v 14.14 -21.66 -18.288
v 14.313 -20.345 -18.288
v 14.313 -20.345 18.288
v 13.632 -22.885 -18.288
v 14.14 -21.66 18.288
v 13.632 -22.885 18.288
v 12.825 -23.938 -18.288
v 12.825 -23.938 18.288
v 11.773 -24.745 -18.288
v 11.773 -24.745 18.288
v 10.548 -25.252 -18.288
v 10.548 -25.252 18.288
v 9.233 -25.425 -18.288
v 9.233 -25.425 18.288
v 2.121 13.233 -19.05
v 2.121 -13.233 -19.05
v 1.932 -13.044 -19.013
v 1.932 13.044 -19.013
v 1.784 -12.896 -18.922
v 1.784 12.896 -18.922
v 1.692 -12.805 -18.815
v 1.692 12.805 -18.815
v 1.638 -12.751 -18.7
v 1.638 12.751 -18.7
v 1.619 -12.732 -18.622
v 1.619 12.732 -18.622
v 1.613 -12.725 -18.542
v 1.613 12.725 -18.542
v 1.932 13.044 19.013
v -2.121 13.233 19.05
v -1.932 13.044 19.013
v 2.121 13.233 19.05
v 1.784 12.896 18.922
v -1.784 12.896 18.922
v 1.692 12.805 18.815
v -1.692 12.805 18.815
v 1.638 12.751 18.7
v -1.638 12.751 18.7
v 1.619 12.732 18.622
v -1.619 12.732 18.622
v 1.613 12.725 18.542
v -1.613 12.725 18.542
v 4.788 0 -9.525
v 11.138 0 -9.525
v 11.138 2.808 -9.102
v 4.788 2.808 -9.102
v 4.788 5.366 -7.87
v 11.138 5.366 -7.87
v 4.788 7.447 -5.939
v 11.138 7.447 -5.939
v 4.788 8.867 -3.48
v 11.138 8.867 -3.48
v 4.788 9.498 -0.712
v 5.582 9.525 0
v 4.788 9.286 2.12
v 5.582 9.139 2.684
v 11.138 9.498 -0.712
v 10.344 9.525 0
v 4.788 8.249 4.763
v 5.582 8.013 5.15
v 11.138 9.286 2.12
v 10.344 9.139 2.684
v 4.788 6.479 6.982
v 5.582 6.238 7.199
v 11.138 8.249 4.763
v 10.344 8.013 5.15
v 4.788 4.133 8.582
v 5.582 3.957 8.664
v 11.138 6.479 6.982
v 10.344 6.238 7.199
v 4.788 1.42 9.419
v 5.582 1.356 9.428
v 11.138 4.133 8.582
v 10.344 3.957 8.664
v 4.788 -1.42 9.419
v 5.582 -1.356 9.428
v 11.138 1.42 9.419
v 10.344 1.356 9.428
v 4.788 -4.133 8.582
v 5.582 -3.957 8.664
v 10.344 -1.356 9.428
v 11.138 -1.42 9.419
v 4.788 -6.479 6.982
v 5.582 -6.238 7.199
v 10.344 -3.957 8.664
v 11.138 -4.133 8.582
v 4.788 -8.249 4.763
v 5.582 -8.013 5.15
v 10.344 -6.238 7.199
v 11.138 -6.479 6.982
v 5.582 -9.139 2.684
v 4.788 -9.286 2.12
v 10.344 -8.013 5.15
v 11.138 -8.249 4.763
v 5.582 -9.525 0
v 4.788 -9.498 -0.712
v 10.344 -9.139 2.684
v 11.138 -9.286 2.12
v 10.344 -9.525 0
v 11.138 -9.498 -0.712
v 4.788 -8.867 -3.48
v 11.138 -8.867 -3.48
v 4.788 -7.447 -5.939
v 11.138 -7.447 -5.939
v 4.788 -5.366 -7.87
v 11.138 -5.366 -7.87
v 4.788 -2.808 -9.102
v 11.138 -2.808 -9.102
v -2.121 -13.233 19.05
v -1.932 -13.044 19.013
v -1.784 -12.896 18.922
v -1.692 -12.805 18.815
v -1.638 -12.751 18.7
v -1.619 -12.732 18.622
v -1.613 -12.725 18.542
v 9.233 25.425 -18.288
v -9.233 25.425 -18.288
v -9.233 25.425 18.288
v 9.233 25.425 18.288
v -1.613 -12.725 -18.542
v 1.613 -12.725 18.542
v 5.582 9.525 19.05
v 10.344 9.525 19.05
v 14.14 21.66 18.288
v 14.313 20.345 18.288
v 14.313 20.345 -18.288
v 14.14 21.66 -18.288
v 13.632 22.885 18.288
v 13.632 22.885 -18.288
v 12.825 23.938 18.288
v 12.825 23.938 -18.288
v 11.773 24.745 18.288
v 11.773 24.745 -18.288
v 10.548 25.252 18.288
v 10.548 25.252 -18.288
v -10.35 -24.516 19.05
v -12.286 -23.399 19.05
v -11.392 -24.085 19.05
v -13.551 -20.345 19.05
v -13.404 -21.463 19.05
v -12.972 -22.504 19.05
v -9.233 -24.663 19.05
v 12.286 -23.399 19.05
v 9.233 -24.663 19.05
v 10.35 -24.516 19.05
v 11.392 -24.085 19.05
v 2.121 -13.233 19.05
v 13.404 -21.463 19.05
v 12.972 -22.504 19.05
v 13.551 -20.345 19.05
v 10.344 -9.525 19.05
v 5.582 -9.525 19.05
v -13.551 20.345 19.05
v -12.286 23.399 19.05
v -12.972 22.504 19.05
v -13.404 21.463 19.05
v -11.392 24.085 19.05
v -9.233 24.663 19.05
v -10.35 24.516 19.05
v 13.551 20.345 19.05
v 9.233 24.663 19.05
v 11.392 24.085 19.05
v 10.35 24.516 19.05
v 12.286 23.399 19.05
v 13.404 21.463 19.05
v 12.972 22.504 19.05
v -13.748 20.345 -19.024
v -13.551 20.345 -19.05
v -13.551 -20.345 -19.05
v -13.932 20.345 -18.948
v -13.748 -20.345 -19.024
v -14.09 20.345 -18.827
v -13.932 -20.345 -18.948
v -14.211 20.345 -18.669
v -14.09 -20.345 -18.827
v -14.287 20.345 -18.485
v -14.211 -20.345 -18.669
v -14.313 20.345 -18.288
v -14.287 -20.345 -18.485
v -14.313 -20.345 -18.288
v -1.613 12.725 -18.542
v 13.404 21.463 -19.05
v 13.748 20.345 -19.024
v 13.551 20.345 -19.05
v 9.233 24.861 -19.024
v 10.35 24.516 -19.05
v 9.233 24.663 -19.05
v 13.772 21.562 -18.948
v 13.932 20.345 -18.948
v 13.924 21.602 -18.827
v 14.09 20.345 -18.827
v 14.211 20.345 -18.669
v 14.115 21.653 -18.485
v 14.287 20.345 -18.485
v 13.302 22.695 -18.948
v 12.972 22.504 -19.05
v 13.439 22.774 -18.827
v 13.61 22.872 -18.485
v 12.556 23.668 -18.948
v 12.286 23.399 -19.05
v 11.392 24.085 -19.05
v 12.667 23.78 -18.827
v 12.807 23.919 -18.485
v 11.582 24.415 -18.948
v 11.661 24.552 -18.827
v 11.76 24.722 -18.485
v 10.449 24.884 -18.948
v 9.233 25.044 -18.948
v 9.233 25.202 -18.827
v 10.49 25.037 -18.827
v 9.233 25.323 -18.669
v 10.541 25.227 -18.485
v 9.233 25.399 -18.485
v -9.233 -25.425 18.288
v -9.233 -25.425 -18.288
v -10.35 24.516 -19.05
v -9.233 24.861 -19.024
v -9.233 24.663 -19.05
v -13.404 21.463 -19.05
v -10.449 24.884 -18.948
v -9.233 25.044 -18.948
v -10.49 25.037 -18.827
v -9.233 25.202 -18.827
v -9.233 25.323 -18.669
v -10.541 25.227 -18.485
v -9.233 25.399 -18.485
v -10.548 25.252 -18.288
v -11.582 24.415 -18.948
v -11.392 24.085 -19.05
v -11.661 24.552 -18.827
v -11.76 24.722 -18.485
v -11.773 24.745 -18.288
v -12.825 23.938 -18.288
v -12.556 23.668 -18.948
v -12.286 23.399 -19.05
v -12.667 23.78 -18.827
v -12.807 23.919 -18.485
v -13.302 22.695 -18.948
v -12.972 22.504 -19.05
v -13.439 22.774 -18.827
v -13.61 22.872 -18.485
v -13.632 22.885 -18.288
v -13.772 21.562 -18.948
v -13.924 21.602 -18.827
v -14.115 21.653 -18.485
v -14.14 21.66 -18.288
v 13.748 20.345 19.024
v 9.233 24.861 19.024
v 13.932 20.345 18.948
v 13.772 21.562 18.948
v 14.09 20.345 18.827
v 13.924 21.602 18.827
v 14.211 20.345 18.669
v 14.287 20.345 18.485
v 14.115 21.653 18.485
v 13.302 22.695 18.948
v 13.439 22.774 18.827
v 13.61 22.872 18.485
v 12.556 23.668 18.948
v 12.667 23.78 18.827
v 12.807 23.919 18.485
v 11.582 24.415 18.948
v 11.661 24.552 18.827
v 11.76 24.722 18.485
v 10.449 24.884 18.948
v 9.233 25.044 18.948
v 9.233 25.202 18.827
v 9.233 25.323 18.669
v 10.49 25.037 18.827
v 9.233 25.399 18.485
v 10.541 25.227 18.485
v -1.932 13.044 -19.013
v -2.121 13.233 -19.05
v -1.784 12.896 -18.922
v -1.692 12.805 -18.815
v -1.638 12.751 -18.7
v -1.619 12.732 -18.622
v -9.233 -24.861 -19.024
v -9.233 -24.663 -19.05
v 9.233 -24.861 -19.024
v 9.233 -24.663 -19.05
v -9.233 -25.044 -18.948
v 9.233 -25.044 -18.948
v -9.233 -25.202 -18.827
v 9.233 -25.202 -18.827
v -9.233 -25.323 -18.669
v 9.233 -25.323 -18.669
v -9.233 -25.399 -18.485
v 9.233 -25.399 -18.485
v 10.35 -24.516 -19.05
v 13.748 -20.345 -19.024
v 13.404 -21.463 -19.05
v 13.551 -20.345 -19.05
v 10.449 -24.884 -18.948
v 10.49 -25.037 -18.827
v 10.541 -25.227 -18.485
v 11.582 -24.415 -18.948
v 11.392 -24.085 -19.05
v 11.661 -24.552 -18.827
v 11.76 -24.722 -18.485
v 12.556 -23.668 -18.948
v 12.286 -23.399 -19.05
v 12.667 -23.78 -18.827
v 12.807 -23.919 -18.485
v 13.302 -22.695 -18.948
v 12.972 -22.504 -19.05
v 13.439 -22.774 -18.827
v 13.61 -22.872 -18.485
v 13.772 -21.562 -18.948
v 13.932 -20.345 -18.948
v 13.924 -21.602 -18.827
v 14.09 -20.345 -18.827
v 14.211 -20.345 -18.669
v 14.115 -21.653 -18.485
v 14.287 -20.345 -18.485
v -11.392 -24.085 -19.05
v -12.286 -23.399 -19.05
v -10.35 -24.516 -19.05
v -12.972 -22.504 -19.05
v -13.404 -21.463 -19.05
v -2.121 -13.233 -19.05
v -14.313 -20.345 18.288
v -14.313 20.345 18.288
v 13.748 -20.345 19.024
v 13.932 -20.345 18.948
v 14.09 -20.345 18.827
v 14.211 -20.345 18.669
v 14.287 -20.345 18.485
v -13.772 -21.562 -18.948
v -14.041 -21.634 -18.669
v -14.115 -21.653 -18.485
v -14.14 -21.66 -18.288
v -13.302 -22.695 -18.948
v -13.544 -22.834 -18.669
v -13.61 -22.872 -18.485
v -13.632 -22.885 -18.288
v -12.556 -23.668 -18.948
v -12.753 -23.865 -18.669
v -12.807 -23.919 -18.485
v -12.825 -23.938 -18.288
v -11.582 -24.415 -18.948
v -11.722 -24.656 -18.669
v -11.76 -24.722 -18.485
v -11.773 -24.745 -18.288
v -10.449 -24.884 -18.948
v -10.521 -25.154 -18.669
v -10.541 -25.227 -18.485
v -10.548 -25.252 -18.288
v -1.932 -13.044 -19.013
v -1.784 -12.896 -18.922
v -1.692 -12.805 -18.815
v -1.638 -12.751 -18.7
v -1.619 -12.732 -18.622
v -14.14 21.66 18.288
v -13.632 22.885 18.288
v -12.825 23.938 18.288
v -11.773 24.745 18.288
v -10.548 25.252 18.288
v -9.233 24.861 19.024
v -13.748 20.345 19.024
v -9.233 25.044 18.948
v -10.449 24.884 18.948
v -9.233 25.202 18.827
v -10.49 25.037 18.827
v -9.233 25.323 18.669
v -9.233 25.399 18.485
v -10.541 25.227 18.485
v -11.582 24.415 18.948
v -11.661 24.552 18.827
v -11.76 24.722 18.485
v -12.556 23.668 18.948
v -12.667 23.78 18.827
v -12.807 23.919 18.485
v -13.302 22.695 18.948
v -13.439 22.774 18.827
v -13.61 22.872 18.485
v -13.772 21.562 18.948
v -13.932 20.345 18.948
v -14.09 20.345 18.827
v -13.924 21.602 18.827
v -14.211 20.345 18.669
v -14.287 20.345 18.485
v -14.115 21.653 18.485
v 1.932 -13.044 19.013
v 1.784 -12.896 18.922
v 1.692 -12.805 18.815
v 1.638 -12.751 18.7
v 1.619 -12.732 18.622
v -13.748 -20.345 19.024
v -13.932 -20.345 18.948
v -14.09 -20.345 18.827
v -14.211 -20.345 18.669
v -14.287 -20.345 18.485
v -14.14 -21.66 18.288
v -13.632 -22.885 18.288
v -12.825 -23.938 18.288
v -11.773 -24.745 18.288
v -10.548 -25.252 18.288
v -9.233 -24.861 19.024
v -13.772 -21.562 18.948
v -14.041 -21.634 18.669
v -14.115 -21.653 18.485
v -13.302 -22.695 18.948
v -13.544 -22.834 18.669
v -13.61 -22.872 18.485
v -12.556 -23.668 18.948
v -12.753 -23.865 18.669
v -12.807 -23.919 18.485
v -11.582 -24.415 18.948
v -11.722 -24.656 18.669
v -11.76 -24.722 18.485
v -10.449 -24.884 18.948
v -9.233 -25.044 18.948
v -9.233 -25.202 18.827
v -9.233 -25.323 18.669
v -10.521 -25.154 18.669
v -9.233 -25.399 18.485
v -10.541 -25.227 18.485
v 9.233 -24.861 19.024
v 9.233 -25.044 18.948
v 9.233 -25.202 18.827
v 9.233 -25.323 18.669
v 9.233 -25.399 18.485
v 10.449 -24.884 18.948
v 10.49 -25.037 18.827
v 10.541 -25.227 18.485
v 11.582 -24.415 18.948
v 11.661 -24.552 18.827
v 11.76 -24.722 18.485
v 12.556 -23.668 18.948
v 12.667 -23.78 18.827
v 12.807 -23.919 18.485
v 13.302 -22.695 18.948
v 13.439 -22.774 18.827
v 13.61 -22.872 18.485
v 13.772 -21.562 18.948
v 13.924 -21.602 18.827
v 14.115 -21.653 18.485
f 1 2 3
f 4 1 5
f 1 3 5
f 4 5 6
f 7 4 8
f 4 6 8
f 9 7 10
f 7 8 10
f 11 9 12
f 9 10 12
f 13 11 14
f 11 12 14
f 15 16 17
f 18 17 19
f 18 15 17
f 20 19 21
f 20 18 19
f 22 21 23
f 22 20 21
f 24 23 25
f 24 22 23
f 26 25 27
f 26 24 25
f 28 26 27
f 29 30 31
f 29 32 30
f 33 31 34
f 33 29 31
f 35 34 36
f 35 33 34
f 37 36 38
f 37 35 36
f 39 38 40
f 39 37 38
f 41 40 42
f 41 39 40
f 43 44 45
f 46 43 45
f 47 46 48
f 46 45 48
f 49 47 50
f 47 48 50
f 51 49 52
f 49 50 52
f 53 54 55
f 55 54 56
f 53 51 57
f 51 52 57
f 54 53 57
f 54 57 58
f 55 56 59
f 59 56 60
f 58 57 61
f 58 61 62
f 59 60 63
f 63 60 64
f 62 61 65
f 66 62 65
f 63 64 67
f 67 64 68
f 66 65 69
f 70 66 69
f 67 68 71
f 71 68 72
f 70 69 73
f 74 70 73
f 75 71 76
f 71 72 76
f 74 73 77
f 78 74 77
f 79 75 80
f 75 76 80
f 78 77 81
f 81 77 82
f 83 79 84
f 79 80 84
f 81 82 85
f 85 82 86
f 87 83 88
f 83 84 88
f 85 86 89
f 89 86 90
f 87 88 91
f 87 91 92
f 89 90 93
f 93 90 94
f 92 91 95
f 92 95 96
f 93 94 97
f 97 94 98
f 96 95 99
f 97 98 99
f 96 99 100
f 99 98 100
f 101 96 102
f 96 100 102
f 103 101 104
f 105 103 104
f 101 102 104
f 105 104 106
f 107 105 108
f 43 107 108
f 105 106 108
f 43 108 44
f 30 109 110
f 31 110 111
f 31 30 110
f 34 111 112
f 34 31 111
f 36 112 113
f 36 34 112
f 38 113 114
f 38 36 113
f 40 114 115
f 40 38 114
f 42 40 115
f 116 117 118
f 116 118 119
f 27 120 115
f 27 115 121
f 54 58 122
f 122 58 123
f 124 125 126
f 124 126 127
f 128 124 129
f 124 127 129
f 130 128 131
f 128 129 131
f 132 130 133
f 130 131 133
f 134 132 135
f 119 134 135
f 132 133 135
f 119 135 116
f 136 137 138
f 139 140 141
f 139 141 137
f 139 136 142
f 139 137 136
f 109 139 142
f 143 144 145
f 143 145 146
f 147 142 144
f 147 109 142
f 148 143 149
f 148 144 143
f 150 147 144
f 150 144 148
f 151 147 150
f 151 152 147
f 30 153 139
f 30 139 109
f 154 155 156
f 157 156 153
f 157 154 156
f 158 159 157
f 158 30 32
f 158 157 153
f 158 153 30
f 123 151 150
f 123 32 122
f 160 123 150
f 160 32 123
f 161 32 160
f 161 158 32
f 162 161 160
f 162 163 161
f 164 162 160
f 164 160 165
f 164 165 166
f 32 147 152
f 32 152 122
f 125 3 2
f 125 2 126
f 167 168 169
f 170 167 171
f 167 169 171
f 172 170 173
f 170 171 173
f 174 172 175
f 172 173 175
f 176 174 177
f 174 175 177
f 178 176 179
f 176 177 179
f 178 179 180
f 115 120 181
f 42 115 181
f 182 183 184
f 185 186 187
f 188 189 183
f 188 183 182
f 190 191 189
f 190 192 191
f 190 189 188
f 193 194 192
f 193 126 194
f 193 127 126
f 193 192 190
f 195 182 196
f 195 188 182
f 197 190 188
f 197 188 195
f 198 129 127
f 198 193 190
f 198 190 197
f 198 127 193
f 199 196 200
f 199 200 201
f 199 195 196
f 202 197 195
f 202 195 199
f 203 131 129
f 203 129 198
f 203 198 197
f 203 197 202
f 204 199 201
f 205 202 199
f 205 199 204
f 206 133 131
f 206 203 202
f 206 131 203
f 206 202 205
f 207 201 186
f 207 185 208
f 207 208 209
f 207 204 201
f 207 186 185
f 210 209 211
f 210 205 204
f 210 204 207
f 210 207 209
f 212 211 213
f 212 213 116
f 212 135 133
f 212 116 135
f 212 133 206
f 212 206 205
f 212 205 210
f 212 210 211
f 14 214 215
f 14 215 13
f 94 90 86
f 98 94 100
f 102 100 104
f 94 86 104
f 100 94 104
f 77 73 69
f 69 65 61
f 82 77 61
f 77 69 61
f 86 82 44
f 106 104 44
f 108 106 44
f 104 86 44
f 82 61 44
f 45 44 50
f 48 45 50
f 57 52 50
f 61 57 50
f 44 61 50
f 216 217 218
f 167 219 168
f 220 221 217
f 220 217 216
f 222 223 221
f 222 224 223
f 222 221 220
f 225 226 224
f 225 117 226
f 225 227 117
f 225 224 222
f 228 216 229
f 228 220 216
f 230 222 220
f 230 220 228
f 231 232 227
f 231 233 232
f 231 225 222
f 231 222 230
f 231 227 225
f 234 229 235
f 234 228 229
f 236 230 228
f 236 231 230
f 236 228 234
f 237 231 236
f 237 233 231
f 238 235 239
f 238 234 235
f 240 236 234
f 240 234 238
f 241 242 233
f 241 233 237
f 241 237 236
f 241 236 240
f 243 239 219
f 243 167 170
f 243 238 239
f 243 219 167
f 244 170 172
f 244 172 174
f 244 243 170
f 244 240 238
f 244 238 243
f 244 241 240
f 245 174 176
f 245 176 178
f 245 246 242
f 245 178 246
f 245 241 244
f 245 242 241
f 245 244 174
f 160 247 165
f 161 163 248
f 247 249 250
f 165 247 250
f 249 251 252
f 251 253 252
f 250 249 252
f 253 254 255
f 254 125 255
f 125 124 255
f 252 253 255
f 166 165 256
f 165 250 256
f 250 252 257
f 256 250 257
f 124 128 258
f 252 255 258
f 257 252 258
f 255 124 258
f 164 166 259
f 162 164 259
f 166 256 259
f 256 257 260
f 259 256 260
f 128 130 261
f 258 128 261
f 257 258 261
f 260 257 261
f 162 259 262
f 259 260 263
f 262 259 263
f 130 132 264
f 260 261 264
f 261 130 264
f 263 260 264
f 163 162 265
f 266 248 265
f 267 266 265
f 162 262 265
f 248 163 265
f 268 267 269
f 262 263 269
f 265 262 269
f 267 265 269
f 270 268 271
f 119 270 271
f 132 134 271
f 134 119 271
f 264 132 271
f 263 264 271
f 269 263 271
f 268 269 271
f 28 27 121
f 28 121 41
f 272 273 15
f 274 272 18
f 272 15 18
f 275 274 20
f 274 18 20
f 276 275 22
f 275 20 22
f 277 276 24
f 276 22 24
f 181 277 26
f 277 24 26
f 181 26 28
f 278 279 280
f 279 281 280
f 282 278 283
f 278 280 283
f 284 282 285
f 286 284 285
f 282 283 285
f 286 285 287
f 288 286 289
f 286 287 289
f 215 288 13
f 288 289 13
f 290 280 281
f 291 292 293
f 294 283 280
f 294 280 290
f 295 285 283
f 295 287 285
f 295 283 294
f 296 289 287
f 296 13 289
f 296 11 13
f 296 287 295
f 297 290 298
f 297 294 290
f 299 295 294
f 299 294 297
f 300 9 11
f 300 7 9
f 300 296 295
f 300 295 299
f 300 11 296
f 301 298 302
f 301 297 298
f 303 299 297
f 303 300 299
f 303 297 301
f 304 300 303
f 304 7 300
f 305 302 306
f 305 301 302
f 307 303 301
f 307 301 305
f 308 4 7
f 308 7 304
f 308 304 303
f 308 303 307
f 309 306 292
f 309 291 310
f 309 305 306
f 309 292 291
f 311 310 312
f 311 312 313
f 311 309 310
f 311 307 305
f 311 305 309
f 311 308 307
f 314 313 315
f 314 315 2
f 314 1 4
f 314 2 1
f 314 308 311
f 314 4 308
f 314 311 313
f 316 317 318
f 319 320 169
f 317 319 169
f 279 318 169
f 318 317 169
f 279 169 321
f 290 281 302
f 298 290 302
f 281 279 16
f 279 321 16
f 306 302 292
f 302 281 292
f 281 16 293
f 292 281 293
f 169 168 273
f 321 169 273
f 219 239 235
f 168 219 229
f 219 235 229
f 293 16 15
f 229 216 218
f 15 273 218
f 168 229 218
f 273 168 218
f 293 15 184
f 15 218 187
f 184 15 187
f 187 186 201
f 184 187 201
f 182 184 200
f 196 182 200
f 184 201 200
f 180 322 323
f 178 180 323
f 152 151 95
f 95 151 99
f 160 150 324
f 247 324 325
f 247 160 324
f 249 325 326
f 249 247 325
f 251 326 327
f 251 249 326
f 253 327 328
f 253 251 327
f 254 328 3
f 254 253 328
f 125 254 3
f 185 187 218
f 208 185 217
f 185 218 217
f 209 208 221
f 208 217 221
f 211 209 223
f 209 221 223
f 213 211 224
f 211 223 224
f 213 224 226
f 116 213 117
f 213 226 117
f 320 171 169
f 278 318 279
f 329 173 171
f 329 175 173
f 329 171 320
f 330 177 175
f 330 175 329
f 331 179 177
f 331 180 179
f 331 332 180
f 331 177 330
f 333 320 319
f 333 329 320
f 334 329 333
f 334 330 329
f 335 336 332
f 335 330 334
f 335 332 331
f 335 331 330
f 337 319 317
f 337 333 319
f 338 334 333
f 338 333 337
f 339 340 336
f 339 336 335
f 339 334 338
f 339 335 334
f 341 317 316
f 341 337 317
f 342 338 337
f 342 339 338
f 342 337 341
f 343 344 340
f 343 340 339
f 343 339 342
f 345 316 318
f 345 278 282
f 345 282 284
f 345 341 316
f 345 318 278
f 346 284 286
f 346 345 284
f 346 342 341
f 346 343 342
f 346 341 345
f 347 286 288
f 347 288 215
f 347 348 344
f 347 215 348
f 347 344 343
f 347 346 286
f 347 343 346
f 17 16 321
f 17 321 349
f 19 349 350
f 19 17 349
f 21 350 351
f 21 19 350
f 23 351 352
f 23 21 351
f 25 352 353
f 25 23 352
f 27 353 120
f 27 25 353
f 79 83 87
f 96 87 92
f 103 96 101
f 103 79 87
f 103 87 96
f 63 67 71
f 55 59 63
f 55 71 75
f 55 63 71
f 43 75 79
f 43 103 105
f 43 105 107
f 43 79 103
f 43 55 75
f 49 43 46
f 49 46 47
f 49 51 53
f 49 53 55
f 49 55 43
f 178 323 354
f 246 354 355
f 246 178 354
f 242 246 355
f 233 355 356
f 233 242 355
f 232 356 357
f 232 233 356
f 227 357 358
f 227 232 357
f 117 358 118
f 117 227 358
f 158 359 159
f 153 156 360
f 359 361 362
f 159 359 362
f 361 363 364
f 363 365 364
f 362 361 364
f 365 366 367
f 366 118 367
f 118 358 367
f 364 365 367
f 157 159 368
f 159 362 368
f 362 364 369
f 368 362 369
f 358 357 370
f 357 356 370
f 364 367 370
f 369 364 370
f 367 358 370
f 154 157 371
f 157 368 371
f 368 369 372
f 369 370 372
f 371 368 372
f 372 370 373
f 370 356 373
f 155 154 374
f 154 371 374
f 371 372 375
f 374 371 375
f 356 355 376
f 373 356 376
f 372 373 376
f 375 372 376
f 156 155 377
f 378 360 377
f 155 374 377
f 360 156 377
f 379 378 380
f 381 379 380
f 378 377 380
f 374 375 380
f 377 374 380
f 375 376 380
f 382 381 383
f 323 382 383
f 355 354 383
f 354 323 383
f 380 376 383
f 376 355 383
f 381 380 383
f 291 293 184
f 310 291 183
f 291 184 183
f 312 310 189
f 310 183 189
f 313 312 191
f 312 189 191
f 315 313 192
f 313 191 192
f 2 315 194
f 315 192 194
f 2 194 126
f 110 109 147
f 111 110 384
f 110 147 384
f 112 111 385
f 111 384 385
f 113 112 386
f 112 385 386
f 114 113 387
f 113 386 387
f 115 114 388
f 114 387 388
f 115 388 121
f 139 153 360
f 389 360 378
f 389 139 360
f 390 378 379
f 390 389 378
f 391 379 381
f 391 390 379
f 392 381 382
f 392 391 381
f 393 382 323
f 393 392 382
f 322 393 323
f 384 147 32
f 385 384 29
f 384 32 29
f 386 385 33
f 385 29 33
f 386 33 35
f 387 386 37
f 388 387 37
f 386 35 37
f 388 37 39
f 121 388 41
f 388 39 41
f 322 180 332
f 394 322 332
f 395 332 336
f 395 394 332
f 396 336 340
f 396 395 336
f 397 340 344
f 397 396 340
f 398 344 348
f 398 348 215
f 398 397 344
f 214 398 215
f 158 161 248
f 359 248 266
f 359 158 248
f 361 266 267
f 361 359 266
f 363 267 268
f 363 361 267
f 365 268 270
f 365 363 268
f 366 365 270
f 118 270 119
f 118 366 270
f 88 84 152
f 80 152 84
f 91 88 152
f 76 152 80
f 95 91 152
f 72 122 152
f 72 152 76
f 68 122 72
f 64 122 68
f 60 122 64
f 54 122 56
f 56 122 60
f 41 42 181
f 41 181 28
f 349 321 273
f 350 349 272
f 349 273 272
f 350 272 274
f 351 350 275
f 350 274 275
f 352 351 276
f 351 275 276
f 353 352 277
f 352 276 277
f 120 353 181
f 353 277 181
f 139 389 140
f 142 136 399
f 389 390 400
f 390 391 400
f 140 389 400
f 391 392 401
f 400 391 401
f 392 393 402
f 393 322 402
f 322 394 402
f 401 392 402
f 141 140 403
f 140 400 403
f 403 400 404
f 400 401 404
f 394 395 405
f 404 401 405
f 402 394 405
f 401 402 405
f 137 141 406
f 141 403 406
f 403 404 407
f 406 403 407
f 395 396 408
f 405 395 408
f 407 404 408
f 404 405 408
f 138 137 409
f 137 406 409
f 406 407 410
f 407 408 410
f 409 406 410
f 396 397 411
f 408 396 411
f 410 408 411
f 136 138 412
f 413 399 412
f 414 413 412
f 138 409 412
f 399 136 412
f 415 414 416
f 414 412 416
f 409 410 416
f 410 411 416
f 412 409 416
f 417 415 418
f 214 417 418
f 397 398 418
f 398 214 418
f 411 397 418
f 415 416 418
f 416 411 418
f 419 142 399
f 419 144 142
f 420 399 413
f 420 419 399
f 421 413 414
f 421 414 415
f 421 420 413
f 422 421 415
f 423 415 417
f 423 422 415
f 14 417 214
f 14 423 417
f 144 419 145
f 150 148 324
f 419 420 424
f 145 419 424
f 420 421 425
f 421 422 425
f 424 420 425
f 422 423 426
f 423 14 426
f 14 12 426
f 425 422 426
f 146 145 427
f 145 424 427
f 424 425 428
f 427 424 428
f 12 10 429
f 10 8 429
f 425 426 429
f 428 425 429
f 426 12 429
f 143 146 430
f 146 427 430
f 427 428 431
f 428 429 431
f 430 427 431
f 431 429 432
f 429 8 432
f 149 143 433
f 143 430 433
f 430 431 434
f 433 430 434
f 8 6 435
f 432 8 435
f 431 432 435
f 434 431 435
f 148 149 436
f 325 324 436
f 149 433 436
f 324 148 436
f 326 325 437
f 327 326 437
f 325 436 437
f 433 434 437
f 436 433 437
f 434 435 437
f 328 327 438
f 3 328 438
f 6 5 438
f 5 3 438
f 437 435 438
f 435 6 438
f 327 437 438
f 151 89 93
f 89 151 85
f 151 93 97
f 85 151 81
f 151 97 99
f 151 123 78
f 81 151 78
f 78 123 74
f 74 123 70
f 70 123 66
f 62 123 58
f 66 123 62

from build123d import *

# Parameters (mm, degrees)
SKETCH1_W           = 28.6258
SKETCH1_H           = 50.8508
SKETCH1_W_2         = 3.2258
SKETCH1_H_2         = 25.4508
BOSS_EXTRUDE1_DEPTH = 19.05
FILLET1_R           = 5.08
FILLET3_R           = 0.762
FILLET4_R           = 0.508
CUT_EXTRUDE1_DEPTH  = 3.175
CUT_EXTRUDE2_DEPTH  = 2.38125


with BuildPart() as part:
    # Sketch1 → Boss-Extrude1 (new, symmetric)
    with BuildSketch(Plane.XY):
        Rectangle(SKETCH1_W, SKETCH1_H)
        Rectangle(SKETCH1_W_2, SKETCH1_H_2, mode=Mode.SUBTRACT)
    extrude(amount=BOSS_EXTRUDE1_DEPTH, both=True)

    # Fillet1
    fillet1_edges = [part.edges().sort_by_distance(p)[0] for p in [
        (-14.3129, -25.4254, 0),
        (14.3129, -25.4254, 0),
        (-14.3129, 25.4254, 0),
        (14.3129, 25.4254, 0),
    ]]
    fillet(fillet1_edges, radius=FILLET1_R)

    # Fillet3
    fillet3_edges = [part.edges().sort_by_distance(p)[0] for p in [
        (12.825002448, -23.937502448, 19.05),
        (0, -25.4254, 19.05),
        (-12.825002448, -23.937502448, 19.05),
        (-14.3129, 0, 19.05),
        (-12.825002448, 23.937502448, 19.05),
        (0, 25.4254, 19.05),
        (12.825002448, 23.937502448, 19.05),
        (12.825002448, -23.937502448, -19.05),
        (0, -25.4254, -19.05),
        (-12.825002448, -23.937502448, -19.05),
        (-14.3129, 0, -19.05),
        (-12.825002448, 23.937502448, -19.05),
        (0, 25.4254, -19.05),
        (12.825002448, 23.937502448, -19.05),
        (14.3129, 0, 19.05),
        (14.3129, 0, -19.05),
    ]]
    fillet(fillet3_edges, radius=FILLET3_R)

    # Fillet4
    fillet4_edges = [part.edges().sort_by_distance(p)[0] for p in [
        (0, 12.7254, 19.05),
        (-1.6129, 0, 19.05),
        (0, -12.7254, 19.05),
        (1.6129, 0, 19.05),
        (0, -12.7254, -19.05),
        (1.6129, 0, -19.05),
        (0, 12.7254, -19.05),
        (-1.6129, 0, -19.05),
    ]]
    fillet(fillet4_edges, radius=FILLET4_R)

    # Sketch2 → Cut-Extrude1 (cut, symmetric)
    with BuildSketch(Plane(origin=(7.9629, 0, 0), x_dir=(0, 0, -1), z_dir=(1, 0, 0))):
        with BuildLine():
            ThreePointArc((9.525, 0), (6.735192091, 6.735192091), (0, 9.525))
            ThreePointArc((0, 9.525), (-9.525, 0), (0, -9.525))
            ThreePointArc((0, -9.525), (6.735192091, -6.735192091), (9.525, 0))
        make_face()
    extrude(amount=CUT_EXTRUDE1_DEPTH, both=True, mode=Mode.SUBTRACT)

    # Sketch2<3> → Cut-Extrude2 (cut, symmetric)
    with BuildSketch(Plane(origin=(7.9629, 0, 0), x_dir=(0, 0, -1), z_dir=(1, 0, 0))):
        with BuildLine():
            ThreePointArc((0, -9.525), (-9.525, 0), (0, 9.525))
            Line((0, 9.525), (-19.05, 9.525))
            Line((-19.05, 9.525), (-19.05, -9.525))
            Line((-19.05, -9.525), (0, -9.525))
        make_face()
    extrude(amount=CUT_EXTRUDE2_DEPTH, both=True, mode=Mode.SUBTRACT)


solid = part.part
